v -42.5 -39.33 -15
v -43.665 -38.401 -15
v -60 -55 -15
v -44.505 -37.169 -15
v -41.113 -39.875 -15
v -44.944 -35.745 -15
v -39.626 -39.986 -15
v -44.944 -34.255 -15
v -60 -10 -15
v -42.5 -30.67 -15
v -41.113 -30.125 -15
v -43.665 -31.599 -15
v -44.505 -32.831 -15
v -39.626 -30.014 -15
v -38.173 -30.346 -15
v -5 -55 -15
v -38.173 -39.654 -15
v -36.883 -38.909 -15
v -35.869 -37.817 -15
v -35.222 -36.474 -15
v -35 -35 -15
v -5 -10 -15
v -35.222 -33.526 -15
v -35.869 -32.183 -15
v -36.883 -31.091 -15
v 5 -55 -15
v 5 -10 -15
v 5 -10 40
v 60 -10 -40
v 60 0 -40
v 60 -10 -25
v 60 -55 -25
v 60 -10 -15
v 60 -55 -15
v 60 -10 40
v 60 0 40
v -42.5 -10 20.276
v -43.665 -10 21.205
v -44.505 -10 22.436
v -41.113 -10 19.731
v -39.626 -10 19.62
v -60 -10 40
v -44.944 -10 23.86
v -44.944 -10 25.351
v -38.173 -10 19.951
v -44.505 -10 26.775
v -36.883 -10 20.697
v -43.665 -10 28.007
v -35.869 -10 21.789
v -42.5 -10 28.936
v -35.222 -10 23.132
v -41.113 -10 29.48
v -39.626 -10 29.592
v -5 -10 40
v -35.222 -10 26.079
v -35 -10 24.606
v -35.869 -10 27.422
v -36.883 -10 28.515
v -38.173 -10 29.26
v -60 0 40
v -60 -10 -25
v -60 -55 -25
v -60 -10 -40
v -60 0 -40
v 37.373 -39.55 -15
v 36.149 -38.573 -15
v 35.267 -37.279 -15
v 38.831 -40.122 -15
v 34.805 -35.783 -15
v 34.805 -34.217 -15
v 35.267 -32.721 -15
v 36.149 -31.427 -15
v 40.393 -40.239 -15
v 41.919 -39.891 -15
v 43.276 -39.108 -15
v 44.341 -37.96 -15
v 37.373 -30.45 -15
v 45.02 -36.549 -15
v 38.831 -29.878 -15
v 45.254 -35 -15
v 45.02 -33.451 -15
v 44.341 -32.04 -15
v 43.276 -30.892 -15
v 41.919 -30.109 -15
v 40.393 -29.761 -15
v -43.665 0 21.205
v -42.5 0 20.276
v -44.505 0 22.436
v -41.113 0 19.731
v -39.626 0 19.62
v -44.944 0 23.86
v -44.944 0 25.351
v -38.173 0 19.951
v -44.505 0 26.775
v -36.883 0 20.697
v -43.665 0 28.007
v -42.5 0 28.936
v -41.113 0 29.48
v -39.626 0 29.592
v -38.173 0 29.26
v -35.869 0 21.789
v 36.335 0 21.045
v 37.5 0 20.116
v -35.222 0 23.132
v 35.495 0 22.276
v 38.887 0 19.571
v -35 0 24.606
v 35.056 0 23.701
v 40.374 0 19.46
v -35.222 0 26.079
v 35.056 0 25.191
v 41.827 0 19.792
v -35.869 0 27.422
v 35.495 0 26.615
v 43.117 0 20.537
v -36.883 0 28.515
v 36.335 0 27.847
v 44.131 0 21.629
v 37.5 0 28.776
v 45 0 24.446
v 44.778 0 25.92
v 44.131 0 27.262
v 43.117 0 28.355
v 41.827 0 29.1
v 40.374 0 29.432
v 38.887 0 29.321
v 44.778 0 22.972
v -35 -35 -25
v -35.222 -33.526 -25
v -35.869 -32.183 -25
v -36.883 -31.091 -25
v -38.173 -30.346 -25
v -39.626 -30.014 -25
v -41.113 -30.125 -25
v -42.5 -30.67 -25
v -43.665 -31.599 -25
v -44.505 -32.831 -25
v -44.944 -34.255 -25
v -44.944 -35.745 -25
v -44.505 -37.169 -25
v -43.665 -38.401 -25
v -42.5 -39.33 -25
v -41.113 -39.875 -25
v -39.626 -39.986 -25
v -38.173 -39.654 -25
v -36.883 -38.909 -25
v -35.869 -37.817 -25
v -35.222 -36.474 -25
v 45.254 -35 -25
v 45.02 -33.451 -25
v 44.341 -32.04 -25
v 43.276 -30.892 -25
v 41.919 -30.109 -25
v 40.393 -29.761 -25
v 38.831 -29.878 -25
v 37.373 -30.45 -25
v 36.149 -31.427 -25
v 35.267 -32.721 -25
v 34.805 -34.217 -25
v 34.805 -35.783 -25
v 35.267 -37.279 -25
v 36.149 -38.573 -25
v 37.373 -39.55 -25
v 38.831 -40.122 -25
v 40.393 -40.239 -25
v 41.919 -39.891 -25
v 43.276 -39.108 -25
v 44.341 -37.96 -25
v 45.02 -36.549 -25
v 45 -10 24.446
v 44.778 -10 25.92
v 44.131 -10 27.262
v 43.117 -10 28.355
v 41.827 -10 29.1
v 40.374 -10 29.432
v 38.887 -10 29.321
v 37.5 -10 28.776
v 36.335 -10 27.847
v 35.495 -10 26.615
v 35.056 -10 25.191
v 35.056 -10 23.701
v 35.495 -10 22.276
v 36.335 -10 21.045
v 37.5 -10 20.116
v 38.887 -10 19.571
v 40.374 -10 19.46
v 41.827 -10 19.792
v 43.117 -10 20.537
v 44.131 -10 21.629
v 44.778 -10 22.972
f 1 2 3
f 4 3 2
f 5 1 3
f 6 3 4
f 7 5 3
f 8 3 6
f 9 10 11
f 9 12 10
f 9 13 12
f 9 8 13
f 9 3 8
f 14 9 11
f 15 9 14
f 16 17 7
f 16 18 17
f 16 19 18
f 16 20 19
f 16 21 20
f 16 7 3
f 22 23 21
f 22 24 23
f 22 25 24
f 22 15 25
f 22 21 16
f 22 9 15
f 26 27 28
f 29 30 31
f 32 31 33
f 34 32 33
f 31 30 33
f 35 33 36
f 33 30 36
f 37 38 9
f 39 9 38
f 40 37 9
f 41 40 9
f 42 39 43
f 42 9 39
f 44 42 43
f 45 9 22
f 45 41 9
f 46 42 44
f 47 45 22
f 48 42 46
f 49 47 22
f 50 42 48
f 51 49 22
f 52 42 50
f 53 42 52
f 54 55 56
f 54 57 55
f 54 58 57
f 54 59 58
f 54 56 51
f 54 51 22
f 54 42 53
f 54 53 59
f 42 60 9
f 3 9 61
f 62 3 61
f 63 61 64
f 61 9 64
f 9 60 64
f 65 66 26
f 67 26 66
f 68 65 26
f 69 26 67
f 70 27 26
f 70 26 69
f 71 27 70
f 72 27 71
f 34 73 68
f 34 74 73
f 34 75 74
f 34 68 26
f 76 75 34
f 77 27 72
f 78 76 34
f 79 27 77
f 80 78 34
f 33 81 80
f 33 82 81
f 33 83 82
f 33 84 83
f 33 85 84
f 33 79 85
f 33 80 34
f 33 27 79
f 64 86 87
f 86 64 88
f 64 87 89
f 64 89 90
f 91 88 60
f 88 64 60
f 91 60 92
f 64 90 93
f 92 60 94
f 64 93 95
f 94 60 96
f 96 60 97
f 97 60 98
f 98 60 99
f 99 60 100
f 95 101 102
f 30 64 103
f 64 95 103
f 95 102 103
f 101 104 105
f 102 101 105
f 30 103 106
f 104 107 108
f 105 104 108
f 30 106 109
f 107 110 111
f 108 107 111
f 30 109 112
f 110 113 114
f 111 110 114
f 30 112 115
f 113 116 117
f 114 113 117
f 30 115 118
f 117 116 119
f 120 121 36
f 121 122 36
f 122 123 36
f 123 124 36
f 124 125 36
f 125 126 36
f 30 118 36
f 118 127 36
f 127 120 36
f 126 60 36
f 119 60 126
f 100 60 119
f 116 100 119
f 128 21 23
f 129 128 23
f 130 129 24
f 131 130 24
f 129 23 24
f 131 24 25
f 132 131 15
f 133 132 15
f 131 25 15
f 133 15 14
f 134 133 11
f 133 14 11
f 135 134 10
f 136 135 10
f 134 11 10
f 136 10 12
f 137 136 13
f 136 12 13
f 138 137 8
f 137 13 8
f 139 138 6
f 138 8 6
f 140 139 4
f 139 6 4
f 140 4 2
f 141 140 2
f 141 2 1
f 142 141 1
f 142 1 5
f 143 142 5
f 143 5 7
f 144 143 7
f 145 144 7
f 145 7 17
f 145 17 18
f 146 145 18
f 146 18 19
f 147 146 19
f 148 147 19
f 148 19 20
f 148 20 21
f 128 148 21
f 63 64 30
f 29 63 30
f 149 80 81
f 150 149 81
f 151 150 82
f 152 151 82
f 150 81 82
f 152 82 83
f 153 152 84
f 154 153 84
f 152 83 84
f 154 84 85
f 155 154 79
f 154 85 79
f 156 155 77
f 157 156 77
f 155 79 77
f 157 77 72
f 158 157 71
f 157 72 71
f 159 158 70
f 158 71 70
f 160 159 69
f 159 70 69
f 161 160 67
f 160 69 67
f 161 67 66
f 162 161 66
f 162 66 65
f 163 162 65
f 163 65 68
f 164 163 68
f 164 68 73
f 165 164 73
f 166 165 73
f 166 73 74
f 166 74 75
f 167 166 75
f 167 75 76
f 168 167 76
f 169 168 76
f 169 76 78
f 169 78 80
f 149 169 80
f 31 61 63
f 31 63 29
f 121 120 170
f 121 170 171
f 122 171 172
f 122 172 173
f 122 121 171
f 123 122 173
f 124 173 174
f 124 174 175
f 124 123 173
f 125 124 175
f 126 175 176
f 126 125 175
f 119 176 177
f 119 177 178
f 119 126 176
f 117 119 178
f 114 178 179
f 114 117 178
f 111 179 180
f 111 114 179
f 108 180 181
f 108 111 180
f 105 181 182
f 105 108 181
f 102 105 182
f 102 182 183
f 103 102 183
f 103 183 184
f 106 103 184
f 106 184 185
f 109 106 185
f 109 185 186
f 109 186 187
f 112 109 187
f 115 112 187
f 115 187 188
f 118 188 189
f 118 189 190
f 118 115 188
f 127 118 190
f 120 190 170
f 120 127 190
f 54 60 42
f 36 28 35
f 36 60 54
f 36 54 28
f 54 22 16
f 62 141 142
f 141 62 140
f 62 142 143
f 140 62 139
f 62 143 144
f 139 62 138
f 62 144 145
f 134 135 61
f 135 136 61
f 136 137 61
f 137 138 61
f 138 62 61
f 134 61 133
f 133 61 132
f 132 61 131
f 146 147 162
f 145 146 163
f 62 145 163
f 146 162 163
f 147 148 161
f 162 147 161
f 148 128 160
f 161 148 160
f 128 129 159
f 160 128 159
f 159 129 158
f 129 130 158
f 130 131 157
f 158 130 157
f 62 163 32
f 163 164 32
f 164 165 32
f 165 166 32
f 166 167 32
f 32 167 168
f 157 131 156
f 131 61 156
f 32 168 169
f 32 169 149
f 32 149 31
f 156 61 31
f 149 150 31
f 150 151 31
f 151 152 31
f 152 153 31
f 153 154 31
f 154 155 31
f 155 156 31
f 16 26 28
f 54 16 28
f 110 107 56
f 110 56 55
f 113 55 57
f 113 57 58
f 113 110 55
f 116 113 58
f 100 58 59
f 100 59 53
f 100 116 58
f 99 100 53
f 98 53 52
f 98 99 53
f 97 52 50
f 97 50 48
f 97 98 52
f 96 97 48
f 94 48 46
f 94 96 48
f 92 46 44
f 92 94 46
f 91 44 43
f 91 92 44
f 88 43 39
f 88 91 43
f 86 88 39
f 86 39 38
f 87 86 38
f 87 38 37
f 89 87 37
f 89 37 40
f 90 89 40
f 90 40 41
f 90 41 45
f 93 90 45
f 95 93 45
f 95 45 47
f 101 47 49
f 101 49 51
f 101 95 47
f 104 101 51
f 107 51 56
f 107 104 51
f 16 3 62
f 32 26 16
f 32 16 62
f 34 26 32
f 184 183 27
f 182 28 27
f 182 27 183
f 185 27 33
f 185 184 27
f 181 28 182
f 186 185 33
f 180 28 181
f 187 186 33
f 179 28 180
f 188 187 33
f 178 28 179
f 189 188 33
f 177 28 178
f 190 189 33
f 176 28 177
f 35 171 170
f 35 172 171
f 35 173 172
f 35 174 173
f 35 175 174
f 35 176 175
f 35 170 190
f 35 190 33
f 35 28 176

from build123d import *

# Parameters (mm, degrees)
F0_W     = 120
F0_H     = 15
F0_H_2   = 13.18299
F0_H_3   = 51.81701
F0_R     = 5
F1_DEPTH = 10
F2_W     = 120
F2_H     = 10
F3_DEPTH = 45
F4_R     = 5
F4_R_2   = 5.25369
F5_DEPTH = 25
F6_W     = 10
F6_H     = 55
F7_DEPTH = 45
F9_DEPTH = 10


with BuildPart() as f1:
    # F0 (on Front) → F1 (new body)
    with BuildSketch(Plane.XZ):
        with Locations((0, -32.5)):
            Rectangle(F0_W, F0_H)
        with Locations((0, -18.408505)):
            Rectangle(F0_W, F0_H_2)
        with Locations((0, 14.091495)):
            Rectangle(F0_W, F0_H_3)
        with Locations((-40, 24.60571)):
            Circle(F0_R, mode=Mode.SUBTRACT)
        with Locations((40, 24.445876)):
            Circle(F0_R, mode=Mode.SUBTRACT)
    extrude(amount=F1_DEPTH)

    # F2 (on face) → F3 (join)
    with BuildSketch(Plane.XZ.offset(10)):
        with Locations((0, -20)):
            Rectangle(F2_W, F2_H)
    extrude(amount=F3_DEPTH)

    # F4 (on face) → F5 (cut)
    with BuildSketch(Plane.XY.offset(-15)):
        with Locations((-40, -35)):
            Circle(F4_R)
        with Locations((40, -35)):
            Circle(F4_R_2)
    extrude(amount=-F5_DEPTH, mode=Mode.SUBTRACT)

    # F6 (on face) → F7 (join)
    with BuildSketch(Plane.XZ.offset(10)):
        with Locations((0, 12.5)):
            Rectangle(F6_W, F6_H)
    extrude(amount=F7_DEPTH)

    # F8 (on face) → F9 (cut)
    with BuildSketch(Plane.YZ.offset(5)):
        Polygon((-55, -15), (-10, 40), (-55, 40), align=None)
    extrude(amount=-F9_DEPTH, mode=Mode.SUBTRACT)


solid = f1.part
